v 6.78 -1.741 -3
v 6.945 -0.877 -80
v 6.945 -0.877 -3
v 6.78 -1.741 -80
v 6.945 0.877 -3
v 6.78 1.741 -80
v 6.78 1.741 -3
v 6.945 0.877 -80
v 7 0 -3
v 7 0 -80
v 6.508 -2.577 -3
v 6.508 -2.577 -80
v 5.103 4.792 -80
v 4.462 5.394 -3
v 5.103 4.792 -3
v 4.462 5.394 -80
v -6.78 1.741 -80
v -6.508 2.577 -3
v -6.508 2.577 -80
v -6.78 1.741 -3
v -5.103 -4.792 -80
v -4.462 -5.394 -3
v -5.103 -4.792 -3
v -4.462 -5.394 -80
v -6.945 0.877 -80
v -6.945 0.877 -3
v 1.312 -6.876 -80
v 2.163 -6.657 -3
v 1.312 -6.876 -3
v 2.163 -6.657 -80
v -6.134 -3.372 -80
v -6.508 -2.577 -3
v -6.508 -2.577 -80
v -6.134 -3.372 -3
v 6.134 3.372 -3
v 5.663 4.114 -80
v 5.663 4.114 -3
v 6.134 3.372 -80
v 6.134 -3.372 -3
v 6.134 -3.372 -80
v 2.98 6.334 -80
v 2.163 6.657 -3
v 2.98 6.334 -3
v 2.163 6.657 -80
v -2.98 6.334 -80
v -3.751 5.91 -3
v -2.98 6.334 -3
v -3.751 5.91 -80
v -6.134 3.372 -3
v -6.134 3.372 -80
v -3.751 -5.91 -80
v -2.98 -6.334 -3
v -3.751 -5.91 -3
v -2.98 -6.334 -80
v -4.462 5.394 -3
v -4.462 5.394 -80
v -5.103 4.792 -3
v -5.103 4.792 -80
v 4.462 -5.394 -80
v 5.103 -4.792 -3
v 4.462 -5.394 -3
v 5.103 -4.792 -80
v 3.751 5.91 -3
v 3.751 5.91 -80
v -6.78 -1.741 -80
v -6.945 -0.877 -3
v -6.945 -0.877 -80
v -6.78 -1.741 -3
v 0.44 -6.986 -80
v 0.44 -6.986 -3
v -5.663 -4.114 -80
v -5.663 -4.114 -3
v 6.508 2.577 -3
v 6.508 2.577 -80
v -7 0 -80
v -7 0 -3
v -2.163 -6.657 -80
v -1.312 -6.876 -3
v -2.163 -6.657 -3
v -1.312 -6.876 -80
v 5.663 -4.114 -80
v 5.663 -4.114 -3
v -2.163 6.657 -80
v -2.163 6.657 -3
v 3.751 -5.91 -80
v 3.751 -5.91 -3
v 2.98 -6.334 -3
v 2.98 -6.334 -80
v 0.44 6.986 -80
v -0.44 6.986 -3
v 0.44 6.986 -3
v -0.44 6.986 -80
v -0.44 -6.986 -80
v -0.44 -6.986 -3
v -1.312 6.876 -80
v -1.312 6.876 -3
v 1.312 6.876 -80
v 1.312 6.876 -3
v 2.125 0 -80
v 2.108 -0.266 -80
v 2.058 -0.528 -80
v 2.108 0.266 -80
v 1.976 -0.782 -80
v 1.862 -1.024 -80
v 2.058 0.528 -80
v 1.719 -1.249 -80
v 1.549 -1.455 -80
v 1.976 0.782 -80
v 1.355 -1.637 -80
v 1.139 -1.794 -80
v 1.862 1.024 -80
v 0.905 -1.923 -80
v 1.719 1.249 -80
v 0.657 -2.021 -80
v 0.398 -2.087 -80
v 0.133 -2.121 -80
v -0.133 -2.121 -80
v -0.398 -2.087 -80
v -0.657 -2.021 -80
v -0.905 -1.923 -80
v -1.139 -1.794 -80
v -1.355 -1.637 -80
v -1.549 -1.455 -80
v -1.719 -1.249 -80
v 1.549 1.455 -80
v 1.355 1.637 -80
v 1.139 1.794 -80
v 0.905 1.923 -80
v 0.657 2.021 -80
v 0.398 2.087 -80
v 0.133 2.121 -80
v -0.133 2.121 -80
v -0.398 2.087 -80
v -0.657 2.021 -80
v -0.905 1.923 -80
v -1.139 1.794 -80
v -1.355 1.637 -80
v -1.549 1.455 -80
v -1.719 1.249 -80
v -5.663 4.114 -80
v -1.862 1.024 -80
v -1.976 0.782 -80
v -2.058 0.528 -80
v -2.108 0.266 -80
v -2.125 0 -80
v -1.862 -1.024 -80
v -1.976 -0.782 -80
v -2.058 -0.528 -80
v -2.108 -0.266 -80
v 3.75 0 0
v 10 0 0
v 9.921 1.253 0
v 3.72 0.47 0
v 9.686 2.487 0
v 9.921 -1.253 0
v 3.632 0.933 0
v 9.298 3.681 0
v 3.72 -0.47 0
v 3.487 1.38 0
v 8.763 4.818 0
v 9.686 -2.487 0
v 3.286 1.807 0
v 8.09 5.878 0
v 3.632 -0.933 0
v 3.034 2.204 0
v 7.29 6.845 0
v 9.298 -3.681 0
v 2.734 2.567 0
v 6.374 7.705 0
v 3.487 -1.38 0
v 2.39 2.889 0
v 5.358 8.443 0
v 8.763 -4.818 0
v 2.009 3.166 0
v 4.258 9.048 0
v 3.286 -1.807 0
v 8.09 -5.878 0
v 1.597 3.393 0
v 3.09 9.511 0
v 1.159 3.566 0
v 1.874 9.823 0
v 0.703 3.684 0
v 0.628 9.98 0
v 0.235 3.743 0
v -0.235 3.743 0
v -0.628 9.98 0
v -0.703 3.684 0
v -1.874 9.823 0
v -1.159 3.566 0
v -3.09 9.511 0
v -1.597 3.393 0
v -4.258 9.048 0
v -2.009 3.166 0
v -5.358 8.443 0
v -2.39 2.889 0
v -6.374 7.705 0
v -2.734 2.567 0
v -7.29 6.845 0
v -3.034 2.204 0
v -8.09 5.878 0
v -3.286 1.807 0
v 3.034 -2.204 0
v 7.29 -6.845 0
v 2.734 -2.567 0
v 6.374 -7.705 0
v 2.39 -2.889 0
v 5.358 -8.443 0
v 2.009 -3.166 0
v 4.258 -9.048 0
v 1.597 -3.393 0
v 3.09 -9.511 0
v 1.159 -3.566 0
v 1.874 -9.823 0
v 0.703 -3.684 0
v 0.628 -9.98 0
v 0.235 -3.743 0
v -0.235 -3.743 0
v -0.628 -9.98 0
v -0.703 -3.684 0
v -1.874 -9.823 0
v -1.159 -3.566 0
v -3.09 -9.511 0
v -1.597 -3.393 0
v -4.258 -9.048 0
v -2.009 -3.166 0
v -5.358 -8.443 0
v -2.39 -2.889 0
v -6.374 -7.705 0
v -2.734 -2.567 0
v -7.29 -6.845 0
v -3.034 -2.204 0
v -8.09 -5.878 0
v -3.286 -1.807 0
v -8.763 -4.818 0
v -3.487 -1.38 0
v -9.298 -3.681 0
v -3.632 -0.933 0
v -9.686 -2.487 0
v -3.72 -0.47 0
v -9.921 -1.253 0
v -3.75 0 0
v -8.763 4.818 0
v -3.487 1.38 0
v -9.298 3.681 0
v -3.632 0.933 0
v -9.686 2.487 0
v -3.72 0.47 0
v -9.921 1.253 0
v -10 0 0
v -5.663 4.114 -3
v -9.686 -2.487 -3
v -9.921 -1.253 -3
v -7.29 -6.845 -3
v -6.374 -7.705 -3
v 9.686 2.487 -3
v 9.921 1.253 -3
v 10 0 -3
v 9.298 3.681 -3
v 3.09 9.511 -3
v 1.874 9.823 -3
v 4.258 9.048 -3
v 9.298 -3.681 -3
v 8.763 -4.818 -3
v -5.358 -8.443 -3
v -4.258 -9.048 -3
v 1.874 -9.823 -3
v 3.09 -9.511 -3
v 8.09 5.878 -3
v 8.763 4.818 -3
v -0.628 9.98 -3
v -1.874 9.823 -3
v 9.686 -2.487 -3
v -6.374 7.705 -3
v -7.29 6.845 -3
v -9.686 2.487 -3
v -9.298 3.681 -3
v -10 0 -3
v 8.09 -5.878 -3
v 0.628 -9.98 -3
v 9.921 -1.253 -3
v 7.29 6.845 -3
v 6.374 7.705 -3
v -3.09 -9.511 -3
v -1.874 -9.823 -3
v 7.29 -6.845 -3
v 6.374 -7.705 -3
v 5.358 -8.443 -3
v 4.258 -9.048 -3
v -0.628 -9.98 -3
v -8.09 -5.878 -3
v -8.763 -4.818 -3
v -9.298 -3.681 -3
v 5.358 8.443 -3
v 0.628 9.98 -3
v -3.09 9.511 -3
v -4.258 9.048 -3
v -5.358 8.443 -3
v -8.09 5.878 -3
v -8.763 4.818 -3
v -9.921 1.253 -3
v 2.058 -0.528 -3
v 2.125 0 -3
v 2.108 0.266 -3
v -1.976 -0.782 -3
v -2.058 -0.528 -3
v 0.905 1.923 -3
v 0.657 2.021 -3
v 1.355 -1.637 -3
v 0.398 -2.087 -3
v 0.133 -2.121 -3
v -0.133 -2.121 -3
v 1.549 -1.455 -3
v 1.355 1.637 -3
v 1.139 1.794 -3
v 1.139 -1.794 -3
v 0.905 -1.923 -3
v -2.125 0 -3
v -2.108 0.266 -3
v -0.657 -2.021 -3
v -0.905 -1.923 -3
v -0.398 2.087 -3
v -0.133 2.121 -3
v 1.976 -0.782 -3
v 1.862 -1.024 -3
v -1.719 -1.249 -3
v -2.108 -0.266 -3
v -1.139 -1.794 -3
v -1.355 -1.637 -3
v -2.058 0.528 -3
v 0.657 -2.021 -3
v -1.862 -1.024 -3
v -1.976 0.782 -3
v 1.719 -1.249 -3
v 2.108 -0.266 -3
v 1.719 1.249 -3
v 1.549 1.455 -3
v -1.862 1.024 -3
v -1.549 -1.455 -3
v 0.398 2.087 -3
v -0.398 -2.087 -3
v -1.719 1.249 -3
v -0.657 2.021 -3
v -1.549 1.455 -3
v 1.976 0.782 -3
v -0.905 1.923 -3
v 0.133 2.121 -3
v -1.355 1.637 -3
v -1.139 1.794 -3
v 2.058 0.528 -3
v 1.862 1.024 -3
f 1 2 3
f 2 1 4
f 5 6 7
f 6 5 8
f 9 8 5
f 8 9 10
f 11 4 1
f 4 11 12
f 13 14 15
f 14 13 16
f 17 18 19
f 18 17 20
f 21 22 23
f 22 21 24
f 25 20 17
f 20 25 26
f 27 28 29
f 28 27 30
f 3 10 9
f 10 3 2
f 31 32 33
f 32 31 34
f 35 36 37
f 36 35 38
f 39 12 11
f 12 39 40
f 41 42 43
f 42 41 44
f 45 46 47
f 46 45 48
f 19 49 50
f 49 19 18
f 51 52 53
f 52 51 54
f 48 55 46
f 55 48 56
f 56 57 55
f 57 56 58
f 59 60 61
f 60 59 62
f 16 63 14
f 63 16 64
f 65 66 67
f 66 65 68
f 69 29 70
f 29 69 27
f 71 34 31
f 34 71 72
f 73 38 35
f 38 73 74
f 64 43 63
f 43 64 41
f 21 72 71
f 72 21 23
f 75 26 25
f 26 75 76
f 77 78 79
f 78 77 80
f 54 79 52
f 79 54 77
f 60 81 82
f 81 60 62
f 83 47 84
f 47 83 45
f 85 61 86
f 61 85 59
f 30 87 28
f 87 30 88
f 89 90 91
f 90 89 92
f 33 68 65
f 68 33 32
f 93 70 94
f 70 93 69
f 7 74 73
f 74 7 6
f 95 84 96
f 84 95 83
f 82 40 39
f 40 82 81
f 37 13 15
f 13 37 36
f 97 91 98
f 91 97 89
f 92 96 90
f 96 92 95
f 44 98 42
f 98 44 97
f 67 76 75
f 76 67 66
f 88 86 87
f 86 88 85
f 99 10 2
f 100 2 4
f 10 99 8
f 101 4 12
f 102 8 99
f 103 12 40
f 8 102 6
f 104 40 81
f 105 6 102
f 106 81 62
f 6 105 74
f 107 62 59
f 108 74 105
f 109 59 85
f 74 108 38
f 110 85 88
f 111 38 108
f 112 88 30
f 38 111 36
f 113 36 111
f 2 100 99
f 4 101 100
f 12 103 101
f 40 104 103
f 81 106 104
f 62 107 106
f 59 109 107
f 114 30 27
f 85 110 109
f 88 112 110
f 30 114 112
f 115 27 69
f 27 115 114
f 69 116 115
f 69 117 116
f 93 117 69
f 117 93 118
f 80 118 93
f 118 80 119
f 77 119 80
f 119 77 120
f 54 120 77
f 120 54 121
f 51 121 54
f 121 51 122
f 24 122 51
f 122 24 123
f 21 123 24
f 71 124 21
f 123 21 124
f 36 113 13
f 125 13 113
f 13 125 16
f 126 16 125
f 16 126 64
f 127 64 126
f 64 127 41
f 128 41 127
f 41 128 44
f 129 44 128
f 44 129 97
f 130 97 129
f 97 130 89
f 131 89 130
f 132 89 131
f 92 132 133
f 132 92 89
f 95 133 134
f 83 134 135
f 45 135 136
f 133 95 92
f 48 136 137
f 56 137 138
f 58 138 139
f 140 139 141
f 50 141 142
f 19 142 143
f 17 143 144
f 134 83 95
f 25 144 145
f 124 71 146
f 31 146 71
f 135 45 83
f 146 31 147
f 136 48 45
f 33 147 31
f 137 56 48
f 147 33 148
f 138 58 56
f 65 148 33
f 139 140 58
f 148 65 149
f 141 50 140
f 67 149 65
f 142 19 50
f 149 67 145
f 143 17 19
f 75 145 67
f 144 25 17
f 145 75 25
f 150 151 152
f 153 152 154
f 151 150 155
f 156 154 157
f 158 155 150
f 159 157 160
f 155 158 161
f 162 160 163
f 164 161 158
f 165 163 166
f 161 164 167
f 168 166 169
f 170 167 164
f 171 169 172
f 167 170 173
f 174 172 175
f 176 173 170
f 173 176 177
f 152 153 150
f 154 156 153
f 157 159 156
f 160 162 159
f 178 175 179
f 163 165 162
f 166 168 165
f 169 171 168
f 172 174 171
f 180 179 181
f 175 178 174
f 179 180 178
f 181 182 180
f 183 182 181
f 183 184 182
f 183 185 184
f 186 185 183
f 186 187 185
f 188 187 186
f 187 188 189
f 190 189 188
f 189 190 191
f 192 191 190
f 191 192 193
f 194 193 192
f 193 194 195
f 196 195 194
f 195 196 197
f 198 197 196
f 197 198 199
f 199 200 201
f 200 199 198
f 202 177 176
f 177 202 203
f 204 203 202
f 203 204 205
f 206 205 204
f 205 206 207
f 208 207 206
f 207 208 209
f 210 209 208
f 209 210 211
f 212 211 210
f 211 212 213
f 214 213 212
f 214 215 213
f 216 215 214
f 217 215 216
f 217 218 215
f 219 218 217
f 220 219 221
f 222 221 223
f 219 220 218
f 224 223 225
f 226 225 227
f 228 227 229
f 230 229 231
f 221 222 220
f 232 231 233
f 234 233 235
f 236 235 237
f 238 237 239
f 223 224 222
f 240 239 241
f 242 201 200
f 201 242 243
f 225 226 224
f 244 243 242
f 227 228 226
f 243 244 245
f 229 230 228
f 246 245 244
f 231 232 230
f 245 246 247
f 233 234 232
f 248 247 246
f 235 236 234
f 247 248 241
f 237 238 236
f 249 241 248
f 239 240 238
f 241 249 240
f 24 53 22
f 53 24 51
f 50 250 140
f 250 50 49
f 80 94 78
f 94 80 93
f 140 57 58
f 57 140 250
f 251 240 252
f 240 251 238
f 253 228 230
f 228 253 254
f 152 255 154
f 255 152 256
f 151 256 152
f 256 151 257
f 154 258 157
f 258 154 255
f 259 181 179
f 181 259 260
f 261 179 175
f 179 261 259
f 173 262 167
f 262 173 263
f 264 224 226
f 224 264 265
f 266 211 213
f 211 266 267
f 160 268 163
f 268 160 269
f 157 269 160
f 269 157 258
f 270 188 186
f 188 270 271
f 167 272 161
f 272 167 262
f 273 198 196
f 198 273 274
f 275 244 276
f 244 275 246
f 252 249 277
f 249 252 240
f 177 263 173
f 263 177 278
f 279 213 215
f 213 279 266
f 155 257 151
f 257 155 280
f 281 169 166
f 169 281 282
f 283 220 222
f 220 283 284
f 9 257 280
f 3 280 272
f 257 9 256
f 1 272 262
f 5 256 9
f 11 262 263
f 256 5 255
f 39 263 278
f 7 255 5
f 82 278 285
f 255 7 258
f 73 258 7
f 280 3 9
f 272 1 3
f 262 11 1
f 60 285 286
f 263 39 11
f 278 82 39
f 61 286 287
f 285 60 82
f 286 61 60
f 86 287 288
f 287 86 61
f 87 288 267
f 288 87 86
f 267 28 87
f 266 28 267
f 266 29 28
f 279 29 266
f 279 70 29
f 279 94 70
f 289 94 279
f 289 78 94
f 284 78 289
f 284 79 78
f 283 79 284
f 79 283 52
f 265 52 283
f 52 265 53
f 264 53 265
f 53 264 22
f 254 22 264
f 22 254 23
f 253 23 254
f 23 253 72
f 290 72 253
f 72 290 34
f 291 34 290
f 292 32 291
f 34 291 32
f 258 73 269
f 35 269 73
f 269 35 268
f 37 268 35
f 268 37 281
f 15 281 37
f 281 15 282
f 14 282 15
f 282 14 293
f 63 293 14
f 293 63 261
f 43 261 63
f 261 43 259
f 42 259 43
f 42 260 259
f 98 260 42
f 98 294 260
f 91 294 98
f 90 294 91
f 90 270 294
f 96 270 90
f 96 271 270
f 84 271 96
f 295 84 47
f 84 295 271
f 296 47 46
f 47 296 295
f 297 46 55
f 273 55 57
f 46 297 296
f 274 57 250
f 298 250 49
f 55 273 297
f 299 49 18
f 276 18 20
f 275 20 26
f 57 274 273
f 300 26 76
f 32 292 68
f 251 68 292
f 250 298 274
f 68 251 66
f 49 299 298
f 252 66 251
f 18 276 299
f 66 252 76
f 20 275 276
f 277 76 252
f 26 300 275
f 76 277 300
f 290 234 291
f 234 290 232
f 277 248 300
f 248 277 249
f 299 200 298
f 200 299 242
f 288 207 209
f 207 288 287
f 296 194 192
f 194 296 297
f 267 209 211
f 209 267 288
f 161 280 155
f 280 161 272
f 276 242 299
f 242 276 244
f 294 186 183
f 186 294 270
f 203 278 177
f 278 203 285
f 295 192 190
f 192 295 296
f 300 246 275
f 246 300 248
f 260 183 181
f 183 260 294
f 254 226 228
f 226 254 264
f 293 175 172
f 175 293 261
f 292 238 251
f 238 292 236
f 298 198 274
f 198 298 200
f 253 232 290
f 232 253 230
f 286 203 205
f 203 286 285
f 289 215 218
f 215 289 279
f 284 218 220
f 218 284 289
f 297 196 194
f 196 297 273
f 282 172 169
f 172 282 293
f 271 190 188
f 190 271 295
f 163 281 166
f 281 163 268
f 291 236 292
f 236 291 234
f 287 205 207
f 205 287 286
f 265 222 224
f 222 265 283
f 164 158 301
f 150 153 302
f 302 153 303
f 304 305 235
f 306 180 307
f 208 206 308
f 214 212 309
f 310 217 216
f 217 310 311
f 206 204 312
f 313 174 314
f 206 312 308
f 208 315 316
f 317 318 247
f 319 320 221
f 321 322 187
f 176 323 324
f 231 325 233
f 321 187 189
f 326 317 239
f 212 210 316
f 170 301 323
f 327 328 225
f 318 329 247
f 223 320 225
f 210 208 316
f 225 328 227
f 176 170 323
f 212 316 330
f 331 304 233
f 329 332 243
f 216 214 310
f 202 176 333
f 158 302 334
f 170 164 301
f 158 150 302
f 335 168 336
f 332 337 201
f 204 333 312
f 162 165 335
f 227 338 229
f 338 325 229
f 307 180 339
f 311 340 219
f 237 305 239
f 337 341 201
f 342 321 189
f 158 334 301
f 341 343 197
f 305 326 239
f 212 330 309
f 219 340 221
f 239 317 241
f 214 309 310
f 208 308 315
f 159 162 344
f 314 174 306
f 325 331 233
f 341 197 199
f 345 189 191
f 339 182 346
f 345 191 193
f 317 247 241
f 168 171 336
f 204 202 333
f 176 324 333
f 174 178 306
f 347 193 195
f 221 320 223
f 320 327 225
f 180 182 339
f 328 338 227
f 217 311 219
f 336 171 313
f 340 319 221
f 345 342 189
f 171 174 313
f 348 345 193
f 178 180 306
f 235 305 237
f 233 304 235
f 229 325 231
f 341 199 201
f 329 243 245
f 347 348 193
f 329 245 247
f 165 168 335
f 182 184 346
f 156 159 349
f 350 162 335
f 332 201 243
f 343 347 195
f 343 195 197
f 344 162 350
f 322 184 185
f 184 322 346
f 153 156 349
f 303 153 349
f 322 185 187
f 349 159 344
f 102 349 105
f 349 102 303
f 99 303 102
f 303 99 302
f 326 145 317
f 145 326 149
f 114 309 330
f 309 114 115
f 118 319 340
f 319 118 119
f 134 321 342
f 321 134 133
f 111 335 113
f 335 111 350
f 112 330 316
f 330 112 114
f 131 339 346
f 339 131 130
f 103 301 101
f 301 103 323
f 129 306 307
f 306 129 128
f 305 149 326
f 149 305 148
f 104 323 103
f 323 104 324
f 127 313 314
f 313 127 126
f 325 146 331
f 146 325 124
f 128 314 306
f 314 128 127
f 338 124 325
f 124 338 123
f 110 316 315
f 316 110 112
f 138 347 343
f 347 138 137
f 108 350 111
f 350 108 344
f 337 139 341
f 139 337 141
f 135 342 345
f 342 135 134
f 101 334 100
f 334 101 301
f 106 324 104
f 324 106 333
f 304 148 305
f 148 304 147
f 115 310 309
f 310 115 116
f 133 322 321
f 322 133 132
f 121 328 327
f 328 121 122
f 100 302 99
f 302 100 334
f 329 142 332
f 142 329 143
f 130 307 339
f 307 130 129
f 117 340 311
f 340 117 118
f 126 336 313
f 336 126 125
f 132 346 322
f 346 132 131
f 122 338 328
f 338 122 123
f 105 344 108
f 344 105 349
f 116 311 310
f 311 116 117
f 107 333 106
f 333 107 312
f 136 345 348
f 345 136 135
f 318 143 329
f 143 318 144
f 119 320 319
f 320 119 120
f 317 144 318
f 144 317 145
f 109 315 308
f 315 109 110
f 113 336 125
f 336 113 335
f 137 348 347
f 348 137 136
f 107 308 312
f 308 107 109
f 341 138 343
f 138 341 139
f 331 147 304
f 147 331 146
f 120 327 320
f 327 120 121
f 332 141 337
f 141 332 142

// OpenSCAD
$fn = 50;


difference() {
	union() {
		translate(v = [0, 0, -80.0000000000]) {
			cylinder(h = 80, r = 7.0000000000);
		}
		translate(v = [0, 0, -3.0000000000]) {
			cylinder(h = 3, r = 10.0000000000);
		}
	}
	union() {
		translate(v = [0, 0, 0]) {
			rotate(a = [0, 0, 0]) {
				difference() {
					union() {
						#translate(v = [0, 0, -80.0000000000]) {
							cylinder(h = 80, r = 2.0000000000);
						}
						#translate(v = [0, 0, -3]) {
							cylinder(h = 3, r = 7.0000000000, r1 = 2.1250000000, r2 = 3.7500000000);
						}
						#translate(v = [0, 0, -80.0000000000]) {
							cylinder(h = 80, r = 2.1250000000);
						}
						#translate(v = [0, 0, -80.0000000000]) {
							cylinder(h = 80, r = 2.0000000000);
						}
					}
					union();
				}
			}
		}
	}
}
